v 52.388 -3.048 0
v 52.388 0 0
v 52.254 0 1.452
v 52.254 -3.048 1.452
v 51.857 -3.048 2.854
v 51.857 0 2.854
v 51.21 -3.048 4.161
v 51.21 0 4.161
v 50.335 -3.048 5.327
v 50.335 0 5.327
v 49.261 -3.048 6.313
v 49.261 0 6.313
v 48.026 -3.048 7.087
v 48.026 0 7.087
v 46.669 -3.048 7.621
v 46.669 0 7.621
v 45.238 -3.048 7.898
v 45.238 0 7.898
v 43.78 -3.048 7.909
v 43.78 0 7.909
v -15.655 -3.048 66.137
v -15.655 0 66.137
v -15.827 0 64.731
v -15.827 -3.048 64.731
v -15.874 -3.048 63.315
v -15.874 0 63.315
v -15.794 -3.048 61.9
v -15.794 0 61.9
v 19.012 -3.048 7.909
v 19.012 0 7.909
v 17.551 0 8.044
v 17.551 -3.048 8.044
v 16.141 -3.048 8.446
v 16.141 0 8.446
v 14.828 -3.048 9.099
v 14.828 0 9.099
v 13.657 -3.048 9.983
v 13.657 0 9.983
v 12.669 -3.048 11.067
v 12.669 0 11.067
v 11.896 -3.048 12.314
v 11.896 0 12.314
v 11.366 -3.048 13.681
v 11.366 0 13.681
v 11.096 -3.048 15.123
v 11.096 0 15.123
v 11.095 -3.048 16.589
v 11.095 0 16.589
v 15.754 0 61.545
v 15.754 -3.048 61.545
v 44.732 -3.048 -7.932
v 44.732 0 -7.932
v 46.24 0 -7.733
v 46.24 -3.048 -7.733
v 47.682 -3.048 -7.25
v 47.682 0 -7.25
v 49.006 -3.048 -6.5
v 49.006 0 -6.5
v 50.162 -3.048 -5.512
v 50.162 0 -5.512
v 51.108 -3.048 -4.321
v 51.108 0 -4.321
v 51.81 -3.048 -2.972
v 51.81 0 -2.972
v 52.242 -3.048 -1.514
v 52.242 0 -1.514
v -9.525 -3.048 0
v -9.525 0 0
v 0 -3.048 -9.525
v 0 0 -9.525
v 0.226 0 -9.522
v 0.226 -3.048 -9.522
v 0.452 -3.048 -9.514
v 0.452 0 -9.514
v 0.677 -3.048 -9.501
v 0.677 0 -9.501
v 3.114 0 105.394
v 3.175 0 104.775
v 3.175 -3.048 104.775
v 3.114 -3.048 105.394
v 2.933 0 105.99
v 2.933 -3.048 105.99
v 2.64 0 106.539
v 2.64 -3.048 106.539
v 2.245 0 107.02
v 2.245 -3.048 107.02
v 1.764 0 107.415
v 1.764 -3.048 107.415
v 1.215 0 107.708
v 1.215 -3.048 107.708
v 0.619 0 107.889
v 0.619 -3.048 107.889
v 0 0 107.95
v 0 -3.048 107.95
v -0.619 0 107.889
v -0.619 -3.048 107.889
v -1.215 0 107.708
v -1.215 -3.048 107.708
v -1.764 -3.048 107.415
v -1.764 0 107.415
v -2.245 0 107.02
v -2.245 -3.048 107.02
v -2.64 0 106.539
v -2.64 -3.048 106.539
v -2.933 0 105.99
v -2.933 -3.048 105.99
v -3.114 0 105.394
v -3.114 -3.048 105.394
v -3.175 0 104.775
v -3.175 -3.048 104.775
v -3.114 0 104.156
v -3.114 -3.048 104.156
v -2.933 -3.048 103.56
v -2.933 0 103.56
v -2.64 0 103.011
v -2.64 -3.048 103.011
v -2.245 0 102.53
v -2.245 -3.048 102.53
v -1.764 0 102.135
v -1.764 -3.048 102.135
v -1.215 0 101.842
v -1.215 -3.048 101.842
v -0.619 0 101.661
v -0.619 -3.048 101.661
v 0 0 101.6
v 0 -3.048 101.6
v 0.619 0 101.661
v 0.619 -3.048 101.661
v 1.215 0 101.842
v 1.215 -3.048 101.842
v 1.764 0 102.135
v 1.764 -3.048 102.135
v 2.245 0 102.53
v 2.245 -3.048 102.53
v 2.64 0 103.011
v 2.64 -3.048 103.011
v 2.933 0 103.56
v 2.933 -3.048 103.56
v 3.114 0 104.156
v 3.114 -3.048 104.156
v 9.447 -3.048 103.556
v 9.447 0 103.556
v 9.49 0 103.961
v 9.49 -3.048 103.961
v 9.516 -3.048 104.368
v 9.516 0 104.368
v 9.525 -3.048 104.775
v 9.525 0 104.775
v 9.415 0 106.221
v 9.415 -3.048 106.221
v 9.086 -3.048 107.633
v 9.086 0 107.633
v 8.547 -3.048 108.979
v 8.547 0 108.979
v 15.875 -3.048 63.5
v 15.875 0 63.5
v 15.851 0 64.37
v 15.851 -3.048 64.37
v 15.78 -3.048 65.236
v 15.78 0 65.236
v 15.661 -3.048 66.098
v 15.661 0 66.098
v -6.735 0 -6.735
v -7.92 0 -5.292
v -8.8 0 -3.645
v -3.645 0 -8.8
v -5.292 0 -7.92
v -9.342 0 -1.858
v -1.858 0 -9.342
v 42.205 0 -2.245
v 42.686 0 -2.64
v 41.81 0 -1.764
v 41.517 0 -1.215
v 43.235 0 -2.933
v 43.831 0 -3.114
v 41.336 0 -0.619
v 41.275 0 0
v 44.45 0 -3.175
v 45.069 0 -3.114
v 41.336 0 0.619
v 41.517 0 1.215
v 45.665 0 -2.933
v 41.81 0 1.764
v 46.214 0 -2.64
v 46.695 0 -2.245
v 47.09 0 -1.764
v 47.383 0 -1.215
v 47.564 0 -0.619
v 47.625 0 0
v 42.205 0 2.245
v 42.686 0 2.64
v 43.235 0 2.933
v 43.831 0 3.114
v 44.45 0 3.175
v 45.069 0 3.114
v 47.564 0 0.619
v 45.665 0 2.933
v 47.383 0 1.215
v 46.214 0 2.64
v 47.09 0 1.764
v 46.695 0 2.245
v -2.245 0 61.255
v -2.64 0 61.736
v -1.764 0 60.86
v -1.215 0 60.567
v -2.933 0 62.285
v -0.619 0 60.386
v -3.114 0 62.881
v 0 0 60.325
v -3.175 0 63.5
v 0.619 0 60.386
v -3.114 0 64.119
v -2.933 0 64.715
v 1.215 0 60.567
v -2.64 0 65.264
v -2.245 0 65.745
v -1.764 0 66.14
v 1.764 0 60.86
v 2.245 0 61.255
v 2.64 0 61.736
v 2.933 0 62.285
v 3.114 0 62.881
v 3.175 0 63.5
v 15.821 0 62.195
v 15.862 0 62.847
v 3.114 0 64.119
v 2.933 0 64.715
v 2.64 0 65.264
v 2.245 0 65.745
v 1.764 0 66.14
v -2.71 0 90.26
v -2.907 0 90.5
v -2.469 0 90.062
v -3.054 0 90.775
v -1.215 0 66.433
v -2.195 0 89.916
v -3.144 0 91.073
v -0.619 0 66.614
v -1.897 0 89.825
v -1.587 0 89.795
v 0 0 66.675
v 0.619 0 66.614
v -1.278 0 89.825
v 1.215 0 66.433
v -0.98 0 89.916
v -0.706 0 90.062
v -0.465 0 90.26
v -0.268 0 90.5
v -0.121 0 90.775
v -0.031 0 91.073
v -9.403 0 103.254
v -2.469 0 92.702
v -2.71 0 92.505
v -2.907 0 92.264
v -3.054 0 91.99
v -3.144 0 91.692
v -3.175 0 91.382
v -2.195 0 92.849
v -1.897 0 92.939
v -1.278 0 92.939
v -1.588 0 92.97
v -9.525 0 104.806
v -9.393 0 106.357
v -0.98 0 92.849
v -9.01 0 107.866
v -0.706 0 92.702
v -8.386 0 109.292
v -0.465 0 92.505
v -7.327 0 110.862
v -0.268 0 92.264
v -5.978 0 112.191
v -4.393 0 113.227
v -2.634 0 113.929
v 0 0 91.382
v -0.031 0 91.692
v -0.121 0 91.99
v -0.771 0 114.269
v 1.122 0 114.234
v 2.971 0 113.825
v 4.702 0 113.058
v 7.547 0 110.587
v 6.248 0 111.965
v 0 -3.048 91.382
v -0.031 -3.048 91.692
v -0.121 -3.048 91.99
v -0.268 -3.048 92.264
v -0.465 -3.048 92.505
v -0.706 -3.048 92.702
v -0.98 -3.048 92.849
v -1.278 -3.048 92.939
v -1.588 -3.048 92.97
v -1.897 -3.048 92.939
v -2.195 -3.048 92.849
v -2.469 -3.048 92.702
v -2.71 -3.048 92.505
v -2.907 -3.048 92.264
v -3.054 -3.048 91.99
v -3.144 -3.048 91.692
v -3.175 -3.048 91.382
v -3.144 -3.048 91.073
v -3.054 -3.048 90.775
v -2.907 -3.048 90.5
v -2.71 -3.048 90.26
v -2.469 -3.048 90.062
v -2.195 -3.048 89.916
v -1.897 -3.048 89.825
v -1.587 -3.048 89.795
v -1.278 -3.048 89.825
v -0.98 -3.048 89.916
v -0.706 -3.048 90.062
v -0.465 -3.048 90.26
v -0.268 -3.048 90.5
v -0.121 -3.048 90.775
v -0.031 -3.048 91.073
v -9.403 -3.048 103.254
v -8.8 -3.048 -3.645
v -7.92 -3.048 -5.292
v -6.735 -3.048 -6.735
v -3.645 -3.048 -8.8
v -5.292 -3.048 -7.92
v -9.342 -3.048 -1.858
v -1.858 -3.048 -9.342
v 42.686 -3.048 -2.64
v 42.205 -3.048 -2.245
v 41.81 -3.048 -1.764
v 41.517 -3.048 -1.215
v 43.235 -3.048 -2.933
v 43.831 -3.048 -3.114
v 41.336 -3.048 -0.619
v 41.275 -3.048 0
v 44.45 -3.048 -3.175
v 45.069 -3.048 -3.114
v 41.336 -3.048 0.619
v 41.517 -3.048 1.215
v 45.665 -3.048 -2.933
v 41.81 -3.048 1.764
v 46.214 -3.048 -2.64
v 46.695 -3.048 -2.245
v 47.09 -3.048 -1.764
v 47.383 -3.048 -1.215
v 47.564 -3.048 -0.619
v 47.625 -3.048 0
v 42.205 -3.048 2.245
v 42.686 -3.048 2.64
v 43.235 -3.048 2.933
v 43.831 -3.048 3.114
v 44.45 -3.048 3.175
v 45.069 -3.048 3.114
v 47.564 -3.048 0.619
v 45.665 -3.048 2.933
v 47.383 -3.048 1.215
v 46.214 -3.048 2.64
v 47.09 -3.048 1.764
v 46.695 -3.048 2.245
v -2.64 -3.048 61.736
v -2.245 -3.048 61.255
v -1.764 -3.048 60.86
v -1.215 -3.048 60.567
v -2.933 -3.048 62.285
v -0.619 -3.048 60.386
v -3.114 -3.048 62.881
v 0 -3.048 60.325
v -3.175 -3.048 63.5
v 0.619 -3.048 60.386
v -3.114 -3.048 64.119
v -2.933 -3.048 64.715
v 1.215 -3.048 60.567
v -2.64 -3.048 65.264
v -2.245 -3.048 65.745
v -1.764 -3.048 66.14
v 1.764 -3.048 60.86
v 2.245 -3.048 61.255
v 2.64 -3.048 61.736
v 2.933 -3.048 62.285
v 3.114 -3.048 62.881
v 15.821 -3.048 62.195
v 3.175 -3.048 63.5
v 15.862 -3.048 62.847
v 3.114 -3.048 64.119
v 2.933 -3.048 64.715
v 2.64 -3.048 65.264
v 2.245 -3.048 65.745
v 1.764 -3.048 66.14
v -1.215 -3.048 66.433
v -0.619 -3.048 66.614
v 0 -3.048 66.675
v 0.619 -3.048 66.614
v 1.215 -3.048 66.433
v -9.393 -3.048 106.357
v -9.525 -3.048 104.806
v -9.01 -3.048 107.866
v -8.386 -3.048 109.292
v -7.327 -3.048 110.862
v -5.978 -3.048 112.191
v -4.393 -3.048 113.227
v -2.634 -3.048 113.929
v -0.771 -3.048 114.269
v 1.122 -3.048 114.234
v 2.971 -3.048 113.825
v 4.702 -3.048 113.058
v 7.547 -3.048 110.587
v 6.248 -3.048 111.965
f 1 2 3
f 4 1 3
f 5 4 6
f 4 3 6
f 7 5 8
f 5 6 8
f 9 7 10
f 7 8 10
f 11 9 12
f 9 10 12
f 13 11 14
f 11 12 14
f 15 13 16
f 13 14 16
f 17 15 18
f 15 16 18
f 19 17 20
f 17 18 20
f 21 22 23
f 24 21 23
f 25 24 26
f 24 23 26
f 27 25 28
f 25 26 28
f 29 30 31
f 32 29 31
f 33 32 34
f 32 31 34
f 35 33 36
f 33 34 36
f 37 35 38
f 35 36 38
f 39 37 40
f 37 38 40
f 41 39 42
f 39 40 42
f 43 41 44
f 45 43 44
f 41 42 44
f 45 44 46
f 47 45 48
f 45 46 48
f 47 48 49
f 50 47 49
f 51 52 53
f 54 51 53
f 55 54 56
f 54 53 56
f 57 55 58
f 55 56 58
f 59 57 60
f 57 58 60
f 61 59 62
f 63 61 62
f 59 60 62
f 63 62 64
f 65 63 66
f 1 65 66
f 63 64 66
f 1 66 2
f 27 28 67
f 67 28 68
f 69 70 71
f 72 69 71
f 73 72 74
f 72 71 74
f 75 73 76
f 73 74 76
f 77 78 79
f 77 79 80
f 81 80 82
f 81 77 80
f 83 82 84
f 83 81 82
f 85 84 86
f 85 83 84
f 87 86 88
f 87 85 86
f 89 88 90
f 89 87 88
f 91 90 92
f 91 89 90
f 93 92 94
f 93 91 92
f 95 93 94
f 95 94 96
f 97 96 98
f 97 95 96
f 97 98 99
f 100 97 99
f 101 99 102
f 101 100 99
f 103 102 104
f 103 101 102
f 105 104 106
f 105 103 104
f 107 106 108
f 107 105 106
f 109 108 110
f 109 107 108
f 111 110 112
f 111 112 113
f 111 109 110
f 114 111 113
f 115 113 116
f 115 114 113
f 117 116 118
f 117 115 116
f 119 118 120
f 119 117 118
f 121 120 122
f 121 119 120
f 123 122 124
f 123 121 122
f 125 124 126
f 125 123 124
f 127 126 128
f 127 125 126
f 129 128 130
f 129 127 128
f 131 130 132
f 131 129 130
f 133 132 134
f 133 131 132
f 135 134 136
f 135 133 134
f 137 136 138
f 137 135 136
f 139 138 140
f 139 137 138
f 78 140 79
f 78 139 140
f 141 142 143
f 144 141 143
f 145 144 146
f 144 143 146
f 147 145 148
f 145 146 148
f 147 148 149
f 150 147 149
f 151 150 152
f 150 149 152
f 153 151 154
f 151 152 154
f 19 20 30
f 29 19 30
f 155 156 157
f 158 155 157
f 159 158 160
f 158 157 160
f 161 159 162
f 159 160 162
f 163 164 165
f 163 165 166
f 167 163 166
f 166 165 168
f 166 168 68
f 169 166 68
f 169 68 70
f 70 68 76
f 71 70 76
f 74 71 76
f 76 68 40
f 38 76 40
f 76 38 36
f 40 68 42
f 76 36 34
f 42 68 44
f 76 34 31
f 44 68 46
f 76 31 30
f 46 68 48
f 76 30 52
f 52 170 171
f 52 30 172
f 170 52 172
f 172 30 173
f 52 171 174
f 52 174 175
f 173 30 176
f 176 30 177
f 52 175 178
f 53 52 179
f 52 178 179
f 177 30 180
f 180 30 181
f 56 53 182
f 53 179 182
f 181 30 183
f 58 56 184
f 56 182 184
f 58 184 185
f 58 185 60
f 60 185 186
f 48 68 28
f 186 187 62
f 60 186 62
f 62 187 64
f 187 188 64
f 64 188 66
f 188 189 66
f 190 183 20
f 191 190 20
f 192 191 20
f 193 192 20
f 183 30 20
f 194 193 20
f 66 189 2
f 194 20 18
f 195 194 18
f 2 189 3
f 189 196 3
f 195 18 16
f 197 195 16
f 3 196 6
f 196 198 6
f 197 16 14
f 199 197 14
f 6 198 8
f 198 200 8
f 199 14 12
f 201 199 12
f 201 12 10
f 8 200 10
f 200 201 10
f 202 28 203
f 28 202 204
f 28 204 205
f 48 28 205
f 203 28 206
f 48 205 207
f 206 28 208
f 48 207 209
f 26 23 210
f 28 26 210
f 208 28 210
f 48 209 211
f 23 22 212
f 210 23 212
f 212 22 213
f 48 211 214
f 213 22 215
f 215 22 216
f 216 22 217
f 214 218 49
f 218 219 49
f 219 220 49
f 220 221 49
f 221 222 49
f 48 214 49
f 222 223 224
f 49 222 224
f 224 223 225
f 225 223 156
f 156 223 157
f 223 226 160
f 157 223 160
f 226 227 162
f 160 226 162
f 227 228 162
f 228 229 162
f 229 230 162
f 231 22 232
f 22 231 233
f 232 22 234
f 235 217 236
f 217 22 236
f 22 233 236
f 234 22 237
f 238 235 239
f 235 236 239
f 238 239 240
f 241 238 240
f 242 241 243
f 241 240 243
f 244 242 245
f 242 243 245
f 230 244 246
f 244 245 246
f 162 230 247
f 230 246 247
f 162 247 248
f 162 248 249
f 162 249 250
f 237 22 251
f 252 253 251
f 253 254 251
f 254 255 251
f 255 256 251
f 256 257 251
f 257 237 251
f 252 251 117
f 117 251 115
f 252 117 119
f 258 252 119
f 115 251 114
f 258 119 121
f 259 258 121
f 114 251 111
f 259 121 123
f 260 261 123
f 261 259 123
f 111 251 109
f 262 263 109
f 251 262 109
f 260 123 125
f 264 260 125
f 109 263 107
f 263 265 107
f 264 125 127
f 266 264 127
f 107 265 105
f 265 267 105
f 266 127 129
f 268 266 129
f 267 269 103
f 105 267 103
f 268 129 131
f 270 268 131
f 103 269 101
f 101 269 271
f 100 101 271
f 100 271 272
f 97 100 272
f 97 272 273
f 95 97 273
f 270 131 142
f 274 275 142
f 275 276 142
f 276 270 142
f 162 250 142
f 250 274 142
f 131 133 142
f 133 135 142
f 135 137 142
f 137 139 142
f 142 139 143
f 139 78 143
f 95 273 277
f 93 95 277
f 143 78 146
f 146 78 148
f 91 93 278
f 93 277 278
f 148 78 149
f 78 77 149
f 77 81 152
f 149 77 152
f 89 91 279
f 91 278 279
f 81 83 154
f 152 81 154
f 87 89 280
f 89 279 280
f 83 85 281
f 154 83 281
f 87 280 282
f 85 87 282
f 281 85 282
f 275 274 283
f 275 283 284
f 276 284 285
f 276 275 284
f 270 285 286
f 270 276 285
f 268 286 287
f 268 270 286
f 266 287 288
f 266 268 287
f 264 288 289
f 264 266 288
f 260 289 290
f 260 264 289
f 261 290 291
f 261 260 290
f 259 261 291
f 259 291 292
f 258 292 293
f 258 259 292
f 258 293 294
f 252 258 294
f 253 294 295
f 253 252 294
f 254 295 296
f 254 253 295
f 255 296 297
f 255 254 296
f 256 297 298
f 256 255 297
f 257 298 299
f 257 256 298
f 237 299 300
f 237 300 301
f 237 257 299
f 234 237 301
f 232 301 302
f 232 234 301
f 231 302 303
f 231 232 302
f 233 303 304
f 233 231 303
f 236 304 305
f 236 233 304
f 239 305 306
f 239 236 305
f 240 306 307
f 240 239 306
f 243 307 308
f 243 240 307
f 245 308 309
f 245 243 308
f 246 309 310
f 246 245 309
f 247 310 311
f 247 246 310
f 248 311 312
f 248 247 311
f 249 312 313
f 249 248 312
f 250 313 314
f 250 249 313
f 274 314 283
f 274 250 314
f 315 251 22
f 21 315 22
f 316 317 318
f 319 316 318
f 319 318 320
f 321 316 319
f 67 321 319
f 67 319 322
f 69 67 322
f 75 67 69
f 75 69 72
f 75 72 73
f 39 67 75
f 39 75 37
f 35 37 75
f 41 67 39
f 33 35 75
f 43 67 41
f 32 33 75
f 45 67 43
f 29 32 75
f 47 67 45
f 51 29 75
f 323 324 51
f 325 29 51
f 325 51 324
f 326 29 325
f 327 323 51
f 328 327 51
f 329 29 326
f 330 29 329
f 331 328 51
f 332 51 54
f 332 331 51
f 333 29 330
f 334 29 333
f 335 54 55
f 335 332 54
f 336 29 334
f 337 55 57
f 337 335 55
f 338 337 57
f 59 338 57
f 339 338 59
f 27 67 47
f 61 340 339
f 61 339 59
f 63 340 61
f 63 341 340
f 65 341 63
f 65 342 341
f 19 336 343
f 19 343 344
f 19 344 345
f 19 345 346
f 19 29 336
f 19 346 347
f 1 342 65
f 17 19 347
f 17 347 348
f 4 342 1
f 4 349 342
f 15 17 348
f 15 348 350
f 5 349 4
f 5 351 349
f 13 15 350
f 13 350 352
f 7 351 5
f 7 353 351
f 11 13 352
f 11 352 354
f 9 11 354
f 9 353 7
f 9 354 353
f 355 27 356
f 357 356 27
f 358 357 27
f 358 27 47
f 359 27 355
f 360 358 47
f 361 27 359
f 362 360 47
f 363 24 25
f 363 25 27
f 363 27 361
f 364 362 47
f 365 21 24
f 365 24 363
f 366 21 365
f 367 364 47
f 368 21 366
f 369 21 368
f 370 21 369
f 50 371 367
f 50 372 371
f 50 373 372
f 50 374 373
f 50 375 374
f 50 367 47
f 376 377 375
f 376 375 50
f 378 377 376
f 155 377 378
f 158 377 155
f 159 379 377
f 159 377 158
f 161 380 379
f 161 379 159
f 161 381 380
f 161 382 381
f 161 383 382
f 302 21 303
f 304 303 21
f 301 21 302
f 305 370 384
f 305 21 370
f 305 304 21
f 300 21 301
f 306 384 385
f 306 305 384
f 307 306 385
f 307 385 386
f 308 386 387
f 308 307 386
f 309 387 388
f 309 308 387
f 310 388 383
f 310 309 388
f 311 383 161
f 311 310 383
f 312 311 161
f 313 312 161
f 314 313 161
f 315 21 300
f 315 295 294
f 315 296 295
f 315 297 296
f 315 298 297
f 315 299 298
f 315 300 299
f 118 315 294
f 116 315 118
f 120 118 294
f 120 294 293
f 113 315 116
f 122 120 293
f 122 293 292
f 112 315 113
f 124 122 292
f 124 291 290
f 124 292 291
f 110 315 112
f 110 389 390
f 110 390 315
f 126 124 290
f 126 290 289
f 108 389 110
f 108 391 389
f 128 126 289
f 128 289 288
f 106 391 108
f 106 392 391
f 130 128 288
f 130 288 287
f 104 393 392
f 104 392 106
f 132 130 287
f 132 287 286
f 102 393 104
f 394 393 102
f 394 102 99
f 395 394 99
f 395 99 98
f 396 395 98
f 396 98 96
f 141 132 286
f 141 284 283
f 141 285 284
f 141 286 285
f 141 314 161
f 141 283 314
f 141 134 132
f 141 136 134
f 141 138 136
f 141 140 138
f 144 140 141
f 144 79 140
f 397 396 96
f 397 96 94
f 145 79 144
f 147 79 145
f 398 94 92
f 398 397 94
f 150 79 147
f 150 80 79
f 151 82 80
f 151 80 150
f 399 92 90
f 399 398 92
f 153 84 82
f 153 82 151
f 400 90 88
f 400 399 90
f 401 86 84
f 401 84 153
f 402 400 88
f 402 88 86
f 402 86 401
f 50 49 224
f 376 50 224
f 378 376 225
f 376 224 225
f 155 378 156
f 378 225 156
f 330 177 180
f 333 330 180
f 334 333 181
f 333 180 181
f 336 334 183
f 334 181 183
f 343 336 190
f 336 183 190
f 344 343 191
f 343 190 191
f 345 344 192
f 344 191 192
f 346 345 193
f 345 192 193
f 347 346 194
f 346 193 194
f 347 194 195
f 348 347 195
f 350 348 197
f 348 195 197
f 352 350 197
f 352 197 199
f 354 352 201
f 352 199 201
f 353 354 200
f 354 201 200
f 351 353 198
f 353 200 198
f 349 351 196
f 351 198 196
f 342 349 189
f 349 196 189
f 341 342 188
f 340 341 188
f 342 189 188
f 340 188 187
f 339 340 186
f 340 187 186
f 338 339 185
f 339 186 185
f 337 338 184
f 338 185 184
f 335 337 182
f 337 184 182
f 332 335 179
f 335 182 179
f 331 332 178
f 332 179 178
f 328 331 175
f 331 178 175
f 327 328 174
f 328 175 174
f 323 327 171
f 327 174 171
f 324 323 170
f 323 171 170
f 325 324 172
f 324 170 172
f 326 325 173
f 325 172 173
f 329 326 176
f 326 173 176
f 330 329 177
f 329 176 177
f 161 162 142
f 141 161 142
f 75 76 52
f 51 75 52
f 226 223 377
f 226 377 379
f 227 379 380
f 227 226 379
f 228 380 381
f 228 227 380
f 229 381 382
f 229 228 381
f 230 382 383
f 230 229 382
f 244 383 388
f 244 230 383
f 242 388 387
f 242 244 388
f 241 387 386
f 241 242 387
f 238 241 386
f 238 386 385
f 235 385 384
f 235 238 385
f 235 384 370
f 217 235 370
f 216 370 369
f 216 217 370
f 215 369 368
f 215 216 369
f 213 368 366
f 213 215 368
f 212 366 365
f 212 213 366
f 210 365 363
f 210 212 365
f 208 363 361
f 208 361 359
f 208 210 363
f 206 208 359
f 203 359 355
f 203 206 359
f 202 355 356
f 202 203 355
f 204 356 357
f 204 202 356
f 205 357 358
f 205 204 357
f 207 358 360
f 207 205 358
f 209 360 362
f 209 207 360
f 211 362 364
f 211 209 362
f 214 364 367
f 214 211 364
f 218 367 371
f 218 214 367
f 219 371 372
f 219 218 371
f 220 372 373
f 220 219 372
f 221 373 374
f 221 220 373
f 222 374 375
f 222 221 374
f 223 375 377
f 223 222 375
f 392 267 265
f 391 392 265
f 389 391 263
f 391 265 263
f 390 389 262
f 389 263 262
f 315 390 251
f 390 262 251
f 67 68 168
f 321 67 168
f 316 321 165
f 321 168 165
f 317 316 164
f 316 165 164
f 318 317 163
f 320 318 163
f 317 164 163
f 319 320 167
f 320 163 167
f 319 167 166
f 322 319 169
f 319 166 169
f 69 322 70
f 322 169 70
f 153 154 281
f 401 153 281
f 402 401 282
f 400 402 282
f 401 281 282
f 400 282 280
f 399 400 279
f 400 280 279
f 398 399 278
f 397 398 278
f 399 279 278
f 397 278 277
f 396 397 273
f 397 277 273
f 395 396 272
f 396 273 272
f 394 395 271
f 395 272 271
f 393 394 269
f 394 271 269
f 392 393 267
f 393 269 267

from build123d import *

# Parameters (mm, degrees)
F0_R     = 3.175
F0_R_2   = 1.5875
F1_DEPTH = 3.048


with BuildPart() as f1:
    # F0 (on Front) → F1 (new body)
    with BuildSketch(Plane.XZ):
        with BuildLine():
            ThreePointArc((-9.525, 0), (0, 9.525), (9.525, 0))
            Line((9.525, 0), (36.5125, 0))
            ThreePointArc((36.5125, 0), (38.605385, 5.370697), (43.780377, 7.909204))
            Line((43.780377, 7.909204), (19.011896, 7.909204))
            ThreePointArc((19.011896, 7.909204), (13.137807, 10.502095), (11.095287, 16.589469))
            Line((11.095287, 16.589469), (15.754219, 61.545461))
            ThreePointArc((15.754219, 61.545461), (-0.178582, 47.626004), (-15.794203, 61.90038))
            Line((-15.794203, 61.90038), (-9.525, 0))
        make_face()
        with BuildLine():
            ThreePointArc((0.677344, -9.500886), (6.970557, -6.491299), (9.525, 0))
            ThreePointArc((9.525, 0), (0, 9.525), (-9.525, 0))
            ThreePointArc((-9.525, 0), (-6.735192, -6.735192), (0, -9.525))
            Line((0, -9.525), (0.677344, -9.500886))
        make_face()
        with BuildLine():
            Line((36.5125, 0), (9.525, 0))
            ThreePointArc((9.525, 0), (6.970557, -6.491299), (0.677344, -9.500886))
            Line((0.677344, -9.500886), (44.732405, -7.932475))
            ThreePointArc((44.732405, -7.932475), (38.93809, -5.711633), (36.5125, 0))
        make_face()
        with BuildLine():
            ThreePointArc((47.625, 0), (44.45, 3.175), (41.275, 0))
            ThreePointArc((41.275, 0), (44.45, -3.175), (47.625, 0))
        make_face()
        with BuildLine():
            ThreePointArc((43.780377, 7.909204), (38.605385, 5.370697), (36.5125, 0))
            ThreePointArc((36.5125, 0), (38.93809, -5.711633), (44.732405, -7.932475))
            ThreePointArc((44.732405, -7.932475), (50.161633, -5.51191), (52.3875, 0))
            ThreePointArc((52.3875, 0), (49.820697, 5.844615), (43.780377, 7.909204))
        make_face()
        with BuildLine():
            ThreePointArc((47.625, 0), (44.45, -3.175), (41.275, 0))
            ThreePointArc((41.275, 0), (44.45, 3.175), (47.625, 0))
        make_face(mode=Mode.SUBTRACT)
        with BuildLine():
            ThreePointArc((0, -9.525), (0.338886, -9.51897), (0.677344, -9.500886))
            Line((0.677344, -9.500886), (0, -9.525))
        make_face()
        with BuildLine():
            ThreePointArc((-15.654504, 66.13669), (-15.866375, 64.023219), (-15.794203, 61.90038))
            ThreePointArc((-15.794203, 61.90038), (-0.178582, 47.626004), (15.754219, 61.545461))
            ThreePointArc((15.754219, 61.545461), (15.844776, 62.520866), (15.875, 63.5))
            ThreePointArc((15.875, 63.5), (15.821396, 64.803473), (15.660948, 66.098142))
            ThreePointArc((15.660948, 66.098142), (0.019541, 79.374988), (-15.654504, 66.13669))
        make_face()
        with Locations((0, 63.5)):
            Circle(F0_R, mode=Mode.SUBTRACT)
        with BuildLine():
            Line((-9.402802, 103.254165), (-15.654504, 66.13669))
            ThreePointArc((-15.654504, 66.13669), (0.019541, 79.374988), (15.660948, 66.098142))
            Line((15.660948, 66.098142), (9.44669, 103.556119))
            ThreePointArc((9.44669, 103.556119), (0.152563, 95.251222), (-9.402802, 103.254165))
        make_face()
        with Locations((-1.5875, 91.382228)):
            Circle(F0_R_2, mode=Mode.SUBTRACT)
        with BuildLine():
            Line((-8.385852, 109.29198), (-9.402802, 103.254165))
            ThreePointArc((-9.402802, 103.254165), (0.152563, 95.251222), (9.44669, 103.556119))
            Line((9.44669, 103.556119), (8.547032, 108.979029))
            ThreePointArc((8.547032, 108.979029), (0.176009, 114.298374), (-8.385852, 109.29198))
        make_face()
        with Locations((0, 104.775)):
            Circle(F0_R, mode=Mode.SUBTRACT)
        with BuildLine():
            ThreePointArc((-8.385852, 109.29198), (-9.392702, 106.357014), (-9.402802, 103.254165))
            Line((-9.402802, 103.254165), (-8.385852, 109.29198))
        make_face()
        with BuildLine():
            Line((8.547032, 108.979029), (9.44669, 103.556119))
            ThreePointArc((9.44669, 103.556119), (9.505402, 104.164303), (9.525, 104.775))
            ThreePointArc((9.525, 104.775), (9.277287, 106.933141), (8.547032, 108.979029))
        make_face()
    extrude(amount=F1_DEPTH)


solid = f1.part
